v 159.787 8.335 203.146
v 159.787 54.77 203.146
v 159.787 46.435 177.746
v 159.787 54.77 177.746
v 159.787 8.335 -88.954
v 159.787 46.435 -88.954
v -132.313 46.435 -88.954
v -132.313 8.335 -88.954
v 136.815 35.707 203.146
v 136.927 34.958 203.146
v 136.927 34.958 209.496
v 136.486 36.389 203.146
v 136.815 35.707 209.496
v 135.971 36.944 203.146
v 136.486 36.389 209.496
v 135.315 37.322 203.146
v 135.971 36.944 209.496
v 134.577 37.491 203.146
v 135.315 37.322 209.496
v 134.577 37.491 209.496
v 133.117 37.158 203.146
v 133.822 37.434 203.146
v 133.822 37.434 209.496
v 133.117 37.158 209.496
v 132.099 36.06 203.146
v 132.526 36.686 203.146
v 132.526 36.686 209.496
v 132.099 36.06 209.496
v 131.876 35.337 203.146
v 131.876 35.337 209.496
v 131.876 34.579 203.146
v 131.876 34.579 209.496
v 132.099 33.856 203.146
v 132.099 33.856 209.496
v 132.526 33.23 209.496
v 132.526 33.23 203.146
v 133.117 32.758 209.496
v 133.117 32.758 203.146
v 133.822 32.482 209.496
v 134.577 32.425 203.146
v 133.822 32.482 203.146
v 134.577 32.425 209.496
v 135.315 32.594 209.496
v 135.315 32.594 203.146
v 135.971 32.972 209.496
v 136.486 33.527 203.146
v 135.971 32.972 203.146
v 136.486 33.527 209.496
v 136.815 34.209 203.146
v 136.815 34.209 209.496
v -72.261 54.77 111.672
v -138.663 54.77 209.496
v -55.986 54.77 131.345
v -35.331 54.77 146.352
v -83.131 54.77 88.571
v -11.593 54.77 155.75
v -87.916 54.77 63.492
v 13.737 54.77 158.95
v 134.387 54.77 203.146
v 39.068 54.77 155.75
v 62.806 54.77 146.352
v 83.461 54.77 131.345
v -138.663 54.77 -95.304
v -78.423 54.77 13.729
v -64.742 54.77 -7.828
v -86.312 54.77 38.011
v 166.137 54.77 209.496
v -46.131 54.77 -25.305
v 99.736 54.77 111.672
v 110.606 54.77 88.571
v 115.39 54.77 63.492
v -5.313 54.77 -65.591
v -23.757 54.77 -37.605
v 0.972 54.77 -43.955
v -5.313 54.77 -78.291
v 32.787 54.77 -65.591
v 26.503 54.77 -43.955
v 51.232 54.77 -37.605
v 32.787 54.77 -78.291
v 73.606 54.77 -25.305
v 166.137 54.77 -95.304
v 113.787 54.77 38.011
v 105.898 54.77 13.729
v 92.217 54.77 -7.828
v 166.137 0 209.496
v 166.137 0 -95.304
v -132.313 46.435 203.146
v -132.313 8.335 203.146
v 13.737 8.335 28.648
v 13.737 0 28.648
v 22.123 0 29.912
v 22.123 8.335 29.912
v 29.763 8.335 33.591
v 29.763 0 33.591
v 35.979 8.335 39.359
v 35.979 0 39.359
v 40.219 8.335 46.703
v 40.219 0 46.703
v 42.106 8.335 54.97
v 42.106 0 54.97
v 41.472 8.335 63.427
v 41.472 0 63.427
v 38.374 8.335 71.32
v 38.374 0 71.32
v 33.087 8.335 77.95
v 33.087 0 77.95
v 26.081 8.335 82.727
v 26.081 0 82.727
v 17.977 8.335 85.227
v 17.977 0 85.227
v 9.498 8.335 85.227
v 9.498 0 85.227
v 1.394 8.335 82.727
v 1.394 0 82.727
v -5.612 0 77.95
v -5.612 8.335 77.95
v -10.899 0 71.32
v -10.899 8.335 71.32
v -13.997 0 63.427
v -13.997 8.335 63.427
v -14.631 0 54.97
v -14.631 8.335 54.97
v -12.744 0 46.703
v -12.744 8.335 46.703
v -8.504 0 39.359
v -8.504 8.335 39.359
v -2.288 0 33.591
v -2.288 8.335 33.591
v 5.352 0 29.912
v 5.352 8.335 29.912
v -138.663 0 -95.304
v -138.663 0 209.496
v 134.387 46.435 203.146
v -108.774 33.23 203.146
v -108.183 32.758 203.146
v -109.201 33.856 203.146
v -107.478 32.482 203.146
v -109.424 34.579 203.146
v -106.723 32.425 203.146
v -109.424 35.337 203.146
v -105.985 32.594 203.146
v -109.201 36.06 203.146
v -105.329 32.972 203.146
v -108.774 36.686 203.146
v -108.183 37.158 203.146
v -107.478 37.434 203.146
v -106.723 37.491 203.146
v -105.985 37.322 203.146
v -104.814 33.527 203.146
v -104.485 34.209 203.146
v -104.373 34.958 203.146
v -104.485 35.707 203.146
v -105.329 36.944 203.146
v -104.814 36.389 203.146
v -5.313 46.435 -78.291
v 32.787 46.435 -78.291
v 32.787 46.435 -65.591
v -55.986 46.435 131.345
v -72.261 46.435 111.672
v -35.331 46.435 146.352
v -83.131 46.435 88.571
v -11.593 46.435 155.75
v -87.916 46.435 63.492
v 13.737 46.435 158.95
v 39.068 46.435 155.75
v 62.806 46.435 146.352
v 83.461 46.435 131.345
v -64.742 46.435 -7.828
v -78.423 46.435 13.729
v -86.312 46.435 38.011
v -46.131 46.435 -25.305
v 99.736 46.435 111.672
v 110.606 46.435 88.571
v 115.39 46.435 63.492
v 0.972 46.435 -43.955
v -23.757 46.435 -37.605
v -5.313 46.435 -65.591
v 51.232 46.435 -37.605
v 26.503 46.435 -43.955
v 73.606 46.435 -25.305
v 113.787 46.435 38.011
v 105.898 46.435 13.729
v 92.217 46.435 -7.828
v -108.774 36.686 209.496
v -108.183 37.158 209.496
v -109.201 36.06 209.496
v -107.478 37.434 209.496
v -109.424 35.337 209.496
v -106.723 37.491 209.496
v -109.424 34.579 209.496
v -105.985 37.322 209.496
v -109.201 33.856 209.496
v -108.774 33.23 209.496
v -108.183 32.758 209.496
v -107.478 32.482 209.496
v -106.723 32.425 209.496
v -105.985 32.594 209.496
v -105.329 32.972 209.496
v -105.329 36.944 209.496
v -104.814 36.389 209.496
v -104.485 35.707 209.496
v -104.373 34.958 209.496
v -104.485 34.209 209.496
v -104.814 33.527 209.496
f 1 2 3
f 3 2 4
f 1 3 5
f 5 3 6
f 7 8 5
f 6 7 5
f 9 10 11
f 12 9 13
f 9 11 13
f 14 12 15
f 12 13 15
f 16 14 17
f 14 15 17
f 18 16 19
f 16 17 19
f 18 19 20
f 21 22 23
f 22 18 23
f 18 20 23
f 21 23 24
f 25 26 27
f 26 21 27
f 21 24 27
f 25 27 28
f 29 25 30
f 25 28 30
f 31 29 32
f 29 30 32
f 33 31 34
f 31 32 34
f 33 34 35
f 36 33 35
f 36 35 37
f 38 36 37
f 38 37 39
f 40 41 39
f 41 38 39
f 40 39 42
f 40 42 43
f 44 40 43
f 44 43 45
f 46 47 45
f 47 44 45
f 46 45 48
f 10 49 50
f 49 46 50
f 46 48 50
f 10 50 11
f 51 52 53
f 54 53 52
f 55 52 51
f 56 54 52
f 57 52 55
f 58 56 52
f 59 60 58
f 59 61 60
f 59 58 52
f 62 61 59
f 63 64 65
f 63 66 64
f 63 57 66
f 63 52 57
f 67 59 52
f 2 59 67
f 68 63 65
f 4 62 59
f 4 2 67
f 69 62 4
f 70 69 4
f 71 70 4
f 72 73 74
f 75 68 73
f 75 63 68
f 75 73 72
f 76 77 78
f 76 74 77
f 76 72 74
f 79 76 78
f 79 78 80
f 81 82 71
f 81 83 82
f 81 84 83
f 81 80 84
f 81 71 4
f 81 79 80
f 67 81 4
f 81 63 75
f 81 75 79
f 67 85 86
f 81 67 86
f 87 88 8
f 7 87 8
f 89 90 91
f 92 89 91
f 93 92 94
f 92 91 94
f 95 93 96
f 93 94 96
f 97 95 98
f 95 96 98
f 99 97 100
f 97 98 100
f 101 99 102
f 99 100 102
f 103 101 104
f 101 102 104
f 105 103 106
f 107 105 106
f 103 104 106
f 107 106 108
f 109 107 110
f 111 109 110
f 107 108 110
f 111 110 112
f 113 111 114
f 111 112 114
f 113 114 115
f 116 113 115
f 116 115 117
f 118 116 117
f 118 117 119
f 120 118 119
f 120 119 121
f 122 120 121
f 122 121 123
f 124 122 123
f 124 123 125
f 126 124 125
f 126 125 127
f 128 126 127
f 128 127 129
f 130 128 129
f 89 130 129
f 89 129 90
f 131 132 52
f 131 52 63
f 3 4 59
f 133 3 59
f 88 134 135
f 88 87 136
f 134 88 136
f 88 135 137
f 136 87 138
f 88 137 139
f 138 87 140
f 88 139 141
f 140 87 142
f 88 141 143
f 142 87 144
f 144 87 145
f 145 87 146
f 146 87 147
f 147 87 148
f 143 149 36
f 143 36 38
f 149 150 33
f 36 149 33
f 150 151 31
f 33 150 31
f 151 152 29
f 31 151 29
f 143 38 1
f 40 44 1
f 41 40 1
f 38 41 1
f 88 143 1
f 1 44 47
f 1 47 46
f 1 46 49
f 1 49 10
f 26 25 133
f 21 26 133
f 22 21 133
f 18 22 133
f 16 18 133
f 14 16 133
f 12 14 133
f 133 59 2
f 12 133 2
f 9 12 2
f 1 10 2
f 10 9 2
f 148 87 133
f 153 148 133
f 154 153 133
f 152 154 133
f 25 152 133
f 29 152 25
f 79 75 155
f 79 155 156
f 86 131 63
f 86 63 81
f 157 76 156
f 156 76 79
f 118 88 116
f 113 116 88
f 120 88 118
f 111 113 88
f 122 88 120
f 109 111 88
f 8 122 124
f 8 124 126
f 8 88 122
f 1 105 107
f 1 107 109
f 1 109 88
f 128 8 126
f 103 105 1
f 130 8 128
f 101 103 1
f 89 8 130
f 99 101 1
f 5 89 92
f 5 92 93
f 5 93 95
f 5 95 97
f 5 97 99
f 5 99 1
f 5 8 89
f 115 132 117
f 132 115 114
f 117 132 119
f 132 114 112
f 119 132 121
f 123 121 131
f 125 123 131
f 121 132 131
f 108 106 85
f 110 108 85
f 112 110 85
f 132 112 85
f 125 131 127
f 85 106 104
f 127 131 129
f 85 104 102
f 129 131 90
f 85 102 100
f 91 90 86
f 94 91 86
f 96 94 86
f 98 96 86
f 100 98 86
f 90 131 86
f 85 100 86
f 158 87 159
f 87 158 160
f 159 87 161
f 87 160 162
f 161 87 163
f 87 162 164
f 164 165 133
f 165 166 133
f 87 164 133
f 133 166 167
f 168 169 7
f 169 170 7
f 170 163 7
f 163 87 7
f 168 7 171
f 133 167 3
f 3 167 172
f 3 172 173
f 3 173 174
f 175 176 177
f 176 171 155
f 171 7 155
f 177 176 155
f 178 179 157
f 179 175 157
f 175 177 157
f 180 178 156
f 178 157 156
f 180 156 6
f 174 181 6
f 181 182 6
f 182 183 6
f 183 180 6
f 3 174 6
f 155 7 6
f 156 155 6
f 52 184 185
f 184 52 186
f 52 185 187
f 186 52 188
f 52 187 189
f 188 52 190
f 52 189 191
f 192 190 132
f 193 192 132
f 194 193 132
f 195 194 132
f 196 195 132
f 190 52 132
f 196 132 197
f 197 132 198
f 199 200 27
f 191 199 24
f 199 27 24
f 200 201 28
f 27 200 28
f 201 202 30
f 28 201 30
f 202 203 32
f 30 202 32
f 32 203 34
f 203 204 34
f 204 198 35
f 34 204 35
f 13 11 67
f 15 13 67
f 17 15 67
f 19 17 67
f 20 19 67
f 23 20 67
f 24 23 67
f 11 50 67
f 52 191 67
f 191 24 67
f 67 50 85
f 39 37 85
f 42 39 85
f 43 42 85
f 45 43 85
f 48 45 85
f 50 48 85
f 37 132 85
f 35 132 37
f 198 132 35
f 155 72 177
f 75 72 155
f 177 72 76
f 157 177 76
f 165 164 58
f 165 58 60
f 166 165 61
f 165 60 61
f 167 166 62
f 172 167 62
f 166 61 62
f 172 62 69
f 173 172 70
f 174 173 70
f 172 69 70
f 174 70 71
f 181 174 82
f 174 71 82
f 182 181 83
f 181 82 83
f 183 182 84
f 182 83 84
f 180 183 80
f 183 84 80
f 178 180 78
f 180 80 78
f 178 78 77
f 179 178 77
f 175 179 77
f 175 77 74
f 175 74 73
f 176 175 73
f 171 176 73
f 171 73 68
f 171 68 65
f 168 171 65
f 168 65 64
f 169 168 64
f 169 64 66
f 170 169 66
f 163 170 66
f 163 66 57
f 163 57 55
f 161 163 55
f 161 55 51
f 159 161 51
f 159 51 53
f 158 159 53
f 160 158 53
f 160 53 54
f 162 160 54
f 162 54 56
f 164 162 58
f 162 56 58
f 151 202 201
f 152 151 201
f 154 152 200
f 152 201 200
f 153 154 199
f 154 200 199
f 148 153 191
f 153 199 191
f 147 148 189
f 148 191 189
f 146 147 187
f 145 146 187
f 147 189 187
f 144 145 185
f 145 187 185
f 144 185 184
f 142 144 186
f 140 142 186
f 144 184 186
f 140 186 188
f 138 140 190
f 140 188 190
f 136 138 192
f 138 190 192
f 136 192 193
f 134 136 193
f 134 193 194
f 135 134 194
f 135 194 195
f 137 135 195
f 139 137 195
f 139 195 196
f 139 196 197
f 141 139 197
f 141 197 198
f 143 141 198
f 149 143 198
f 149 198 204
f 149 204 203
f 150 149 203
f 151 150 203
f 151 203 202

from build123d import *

# Parameters (mm, degrees)
SKETCH1_W               = 304.8
SKETCH1_H               = 304.8
BOSS_EXTRUDE1_DEPTH     = 54.77002
SKETCH2_R               = 101.854
SKETCH2_W               = 38.1
SKETCH2_H               = 12.7
CUT_EXTRUDE3_DEPTH      = 38.1
SKETCH3_R               = 2.54
CUT_EXTRUDE4_DEPTH      = 31.75
CUT_EXTRUDE5_DEPTH      = 19.05
CUT_EXTRUDE5_DEPTH_BACK = 19.05
SKETCH4_W               = 292.1
SKETCH4_H               = 292.1
SKETCH5_R               = 28.448
CUT_EXTRUDE6_DEPTH      = 273.928796473


with BuildPart() as part:
    # Sketch1 → Boss-Extrude1 (new body)
    with BuildSketch(Plane(origin=(0, 0, 0), x_dir=(1, 0, 0), z_dir=(0, 1, 0))):
        with Locations((13.737464789, -57.096338028)):
            Rectangle(SKETCH1_W, SKETCH1_H)
    extrude(amount=BOSS_EXTRUDE1_DEPTH)

    # Sketch2 → Cut-Extrude3 (cut)
    with BuildSketch(Plane(origin=(0, 54.77002, 0), x_dir=(1, 0, 0), z_dir=(0, 1, 0))):
        with Locations(Location((13.737464789, -57.096338028, 0), (0, 0, 270))):
            Circle(SKETCH2_R)
        Polygon((134.387464789, -203.146338028), (159.787464789, -203.146338028), (159.787464789, -177.746338028), align=None)
        with Locations((13.737464789, 71.941420767)):
            Rectangle(SKETCH2_W, SKETCH2_H)
    extrude(amount=-CUT_EXTRUDE3_DEPTH, mode=Mode.SUBTRACT)

    # Sketch3 → Cut-Extrude4 (cut)
    with BuildSketch(Plane.XY.offset(209.496338028)):
        with Locations((134.387464789, 34.95802)):
            Circle(SKETCH3_R)
        with Locations((-106.912535211, 34.95802)):
            Circle(SKETCH3_R)
    extrude(amount=-CUT_EXTRUDE4_DEPTH, mode=Mode.SUBTRACT)

    # Sketch4 → Cut-Extrude5 (cut, two sides: drawn at the far end of the back side and taken through both)
    with BuildSketch(Plane(origin=(0, 27.38501, 0), x_dir=(1, 0, 0), z_dir=(0, 1, 0)).offset(-CUT_EXTRUDE5_DEPTH_BACK)):
        with Locations((13.737464789, -57.096338028)):
            Rectangle(SKETCH4_W, SKETCH4_H)
    extrude(amount=CUT_EXTRUDE5_DEPTH + CUT_EXTRUDE5_DEPTH_BACK, mode=Mode.SUBTRACT)

    # Sketch5 → Cut-Extrude6 (cut, through all)
    with BuildSketch(Plane.XZ):
        with Locations(Location((13.737464789, 57.096338028, 0), (0, 0, 270))):
            Circle(SKETCH5_R)
    extrude(amount=-CUT_EXTRUDE6_DEPTH, mode=Mode.SUBTRACT)


solid = part.part
